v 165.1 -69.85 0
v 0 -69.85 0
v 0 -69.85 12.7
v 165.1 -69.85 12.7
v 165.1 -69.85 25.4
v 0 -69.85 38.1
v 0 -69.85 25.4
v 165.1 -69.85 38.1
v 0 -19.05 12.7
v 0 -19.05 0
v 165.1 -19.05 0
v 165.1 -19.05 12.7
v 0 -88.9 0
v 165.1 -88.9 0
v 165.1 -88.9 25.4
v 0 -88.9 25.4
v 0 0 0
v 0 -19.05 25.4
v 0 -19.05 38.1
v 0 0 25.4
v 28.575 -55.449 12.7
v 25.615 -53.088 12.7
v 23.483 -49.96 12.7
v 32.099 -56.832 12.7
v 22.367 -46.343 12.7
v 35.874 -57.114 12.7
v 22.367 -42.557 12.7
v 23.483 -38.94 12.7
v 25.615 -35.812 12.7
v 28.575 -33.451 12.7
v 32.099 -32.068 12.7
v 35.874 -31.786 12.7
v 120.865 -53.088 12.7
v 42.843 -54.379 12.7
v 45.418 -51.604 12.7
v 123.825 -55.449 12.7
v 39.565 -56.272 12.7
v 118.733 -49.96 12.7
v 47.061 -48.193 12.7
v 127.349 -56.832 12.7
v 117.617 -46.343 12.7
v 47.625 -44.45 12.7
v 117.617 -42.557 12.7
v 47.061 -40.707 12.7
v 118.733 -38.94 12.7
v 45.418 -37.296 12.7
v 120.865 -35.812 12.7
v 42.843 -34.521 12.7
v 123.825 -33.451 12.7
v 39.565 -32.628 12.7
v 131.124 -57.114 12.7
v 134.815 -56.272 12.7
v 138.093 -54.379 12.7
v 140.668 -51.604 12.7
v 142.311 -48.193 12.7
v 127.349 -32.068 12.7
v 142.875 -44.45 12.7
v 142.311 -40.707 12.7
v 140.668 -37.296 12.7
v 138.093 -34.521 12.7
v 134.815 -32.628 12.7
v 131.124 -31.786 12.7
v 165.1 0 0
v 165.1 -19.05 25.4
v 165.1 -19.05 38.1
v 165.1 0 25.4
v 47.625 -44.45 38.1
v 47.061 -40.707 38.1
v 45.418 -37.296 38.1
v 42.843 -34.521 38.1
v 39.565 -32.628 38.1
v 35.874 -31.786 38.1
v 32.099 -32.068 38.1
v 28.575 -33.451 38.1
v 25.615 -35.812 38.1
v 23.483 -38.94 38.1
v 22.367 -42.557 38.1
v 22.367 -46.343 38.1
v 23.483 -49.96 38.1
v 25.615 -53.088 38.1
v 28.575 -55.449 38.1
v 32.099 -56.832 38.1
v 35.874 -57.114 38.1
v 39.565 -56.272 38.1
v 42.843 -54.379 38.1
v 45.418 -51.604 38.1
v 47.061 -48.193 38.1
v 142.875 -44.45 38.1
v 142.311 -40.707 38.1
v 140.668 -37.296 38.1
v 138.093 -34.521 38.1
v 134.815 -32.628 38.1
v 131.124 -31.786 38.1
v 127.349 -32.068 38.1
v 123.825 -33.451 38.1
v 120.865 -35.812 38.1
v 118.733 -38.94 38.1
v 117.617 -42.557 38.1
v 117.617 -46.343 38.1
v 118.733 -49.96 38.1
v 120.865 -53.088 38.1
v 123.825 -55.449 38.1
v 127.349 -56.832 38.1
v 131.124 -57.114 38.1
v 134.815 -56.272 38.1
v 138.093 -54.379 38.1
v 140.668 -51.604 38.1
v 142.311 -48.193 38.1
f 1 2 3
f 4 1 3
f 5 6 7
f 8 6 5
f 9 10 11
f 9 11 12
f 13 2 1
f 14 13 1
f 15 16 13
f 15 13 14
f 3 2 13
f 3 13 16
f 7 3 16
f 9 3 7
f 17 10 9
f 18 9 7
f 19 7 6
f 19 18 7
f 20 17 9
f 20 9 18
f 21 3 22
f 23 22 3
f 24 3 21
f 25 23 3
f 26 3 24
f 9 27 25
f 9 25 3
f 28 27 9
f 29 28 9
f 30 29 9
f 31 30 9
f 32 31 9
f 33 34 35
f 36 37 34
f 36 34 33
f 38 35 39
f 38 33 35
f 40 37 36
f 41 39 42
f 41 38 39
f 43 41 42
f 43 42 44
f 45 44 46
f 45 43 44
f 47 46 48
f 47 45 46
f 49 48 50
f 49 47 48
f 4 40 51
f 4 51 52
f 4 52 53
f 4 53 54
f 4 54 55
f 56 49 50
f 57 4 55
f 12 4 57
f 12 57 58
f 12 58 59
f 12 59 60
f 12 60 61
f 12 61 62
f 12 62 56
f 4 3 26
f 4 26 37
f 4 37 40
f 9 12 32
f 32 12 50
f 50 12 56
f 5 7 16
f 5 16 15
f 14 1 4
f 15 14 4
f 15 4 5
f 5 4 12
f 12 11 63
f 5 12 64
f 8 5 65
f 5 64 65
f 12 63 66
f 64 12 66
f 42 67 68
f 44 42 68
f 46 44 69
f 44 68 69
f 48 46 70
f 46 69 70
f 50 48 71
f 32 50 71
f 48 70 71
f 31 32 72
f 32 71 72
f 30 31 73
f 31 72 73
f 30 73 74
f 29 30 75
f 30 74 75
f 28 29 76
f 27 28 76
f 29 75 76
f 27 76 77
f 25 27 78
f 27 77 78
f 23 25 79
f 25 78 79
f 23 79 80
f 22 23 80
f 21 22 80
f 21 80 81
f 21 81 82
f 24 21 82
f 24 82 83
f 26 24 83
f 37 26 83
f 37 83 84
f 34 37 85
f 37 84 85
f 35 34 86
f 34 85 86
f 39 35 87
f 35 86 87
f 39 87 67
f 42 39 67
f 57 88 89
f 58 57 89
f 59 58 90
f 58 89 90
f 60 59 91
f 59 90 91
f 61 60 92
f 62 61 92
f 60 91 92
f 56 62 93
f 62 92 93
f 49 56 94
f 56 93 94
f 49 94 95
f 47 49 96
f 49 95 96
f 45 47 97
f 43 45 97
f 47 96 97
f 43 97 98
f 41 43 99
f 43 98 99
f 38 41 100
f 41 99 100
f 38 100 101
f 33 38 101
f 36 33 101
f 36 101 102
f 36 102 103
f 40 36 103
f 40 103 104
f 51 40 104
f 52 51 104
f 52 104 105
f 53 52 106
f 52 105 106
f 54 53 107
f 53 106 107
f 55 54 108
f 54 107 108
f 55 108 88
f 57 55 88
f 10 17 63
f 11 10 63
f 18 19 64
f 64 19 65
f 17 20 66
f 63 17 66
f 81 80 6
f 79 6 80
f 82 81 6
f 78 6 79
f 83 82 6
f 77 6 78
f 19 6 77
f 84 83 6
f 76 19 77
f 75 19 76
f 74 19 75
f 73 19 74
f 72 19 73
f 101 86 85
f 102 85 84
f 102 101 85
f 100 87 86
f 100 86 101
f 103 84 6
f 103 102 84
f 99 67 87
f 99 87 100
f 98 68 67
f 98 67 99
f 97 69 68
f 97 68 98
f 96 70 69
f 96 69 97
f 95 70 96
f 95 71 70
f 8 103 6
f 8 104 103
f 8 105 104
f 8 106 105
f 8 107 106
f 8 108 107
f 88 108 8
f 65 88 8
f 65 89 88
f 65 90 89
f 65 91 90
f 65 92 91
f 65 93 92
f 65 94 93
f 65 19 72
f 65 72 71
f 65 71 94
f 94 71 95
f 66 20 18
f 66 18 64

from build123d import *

# Parameters (mm, degrees)
F0_W     = 165.1
F0_H     = 38.1
F1_DEPTH = 88.9
F2_W     = 50.8
F2_H     = 12.7
F3_DEPTH = 165.1
F4_W     = 165.1
F4_H     = 19.05
F5_DEPTH = 12.7
F6_DEPTH = 12.7
F7_R     = 12.7
F8_DEPTH = 25.4
F9_DEPTH = 25.4


with BuildPart() as f1:
    # F0 (on Front) → F1 (new body)
    with BuildSketch(Plane.XZ):
        with Locations((82.55, 19.05)):
            Rectangle(F0_W, F0_H)
    extrude(amount=F1_DEPTH)

    # F2 (on face) → F3 (cut)
    with BuildSketch(Plane.YZ.offset(165.1)):
        with Locations((-44.45, 6.35)):
            Rectangle(F2_W, F2_H)
    extrude(amount=-F3_DEPTH, mode=Mode.SUBTRACT)

    # F4 (on face) → F5 (cut)
    with BuildSketch(Plane.XY.offset(38.1)):
        with Locations((82.55, -79.375)):
            Rectangle(F4_W, F4_H)
    extrude(amount=-F5_DEPTH, mode=Mode.SUBTRACT)

    # F4 (on face) → F6 (cut)
    with BuildSketch(Plane.XY.offset(38.1)):
        with Locations((82.55, -9.525)):
            Rectangle(F4_W, F4_H)
    extrude(amount=-F6_DEPTH, mode=Mode.SUBTRACT)

    # F7 (on face) → F8 (cut, through all)
    with BuildSketch(Plane.XY.offset(38.1)):
        with Locations((130.175, -44.45)):
            Circle(F7_R)
    extrude(amount=-F8_DEPTH, mode=Mode.SUBTRACT)

    # F7 (on face) → F9 (cut, through all)
    with BuildSketch(Plane.XY.offset(38.1)):
        with Locations((34.925, -44.45)):
            Circle(F7_R)
    extrude(amount=-F9_DEPTH, mode=Mode.SUBTRACT)


solid = f1.part
